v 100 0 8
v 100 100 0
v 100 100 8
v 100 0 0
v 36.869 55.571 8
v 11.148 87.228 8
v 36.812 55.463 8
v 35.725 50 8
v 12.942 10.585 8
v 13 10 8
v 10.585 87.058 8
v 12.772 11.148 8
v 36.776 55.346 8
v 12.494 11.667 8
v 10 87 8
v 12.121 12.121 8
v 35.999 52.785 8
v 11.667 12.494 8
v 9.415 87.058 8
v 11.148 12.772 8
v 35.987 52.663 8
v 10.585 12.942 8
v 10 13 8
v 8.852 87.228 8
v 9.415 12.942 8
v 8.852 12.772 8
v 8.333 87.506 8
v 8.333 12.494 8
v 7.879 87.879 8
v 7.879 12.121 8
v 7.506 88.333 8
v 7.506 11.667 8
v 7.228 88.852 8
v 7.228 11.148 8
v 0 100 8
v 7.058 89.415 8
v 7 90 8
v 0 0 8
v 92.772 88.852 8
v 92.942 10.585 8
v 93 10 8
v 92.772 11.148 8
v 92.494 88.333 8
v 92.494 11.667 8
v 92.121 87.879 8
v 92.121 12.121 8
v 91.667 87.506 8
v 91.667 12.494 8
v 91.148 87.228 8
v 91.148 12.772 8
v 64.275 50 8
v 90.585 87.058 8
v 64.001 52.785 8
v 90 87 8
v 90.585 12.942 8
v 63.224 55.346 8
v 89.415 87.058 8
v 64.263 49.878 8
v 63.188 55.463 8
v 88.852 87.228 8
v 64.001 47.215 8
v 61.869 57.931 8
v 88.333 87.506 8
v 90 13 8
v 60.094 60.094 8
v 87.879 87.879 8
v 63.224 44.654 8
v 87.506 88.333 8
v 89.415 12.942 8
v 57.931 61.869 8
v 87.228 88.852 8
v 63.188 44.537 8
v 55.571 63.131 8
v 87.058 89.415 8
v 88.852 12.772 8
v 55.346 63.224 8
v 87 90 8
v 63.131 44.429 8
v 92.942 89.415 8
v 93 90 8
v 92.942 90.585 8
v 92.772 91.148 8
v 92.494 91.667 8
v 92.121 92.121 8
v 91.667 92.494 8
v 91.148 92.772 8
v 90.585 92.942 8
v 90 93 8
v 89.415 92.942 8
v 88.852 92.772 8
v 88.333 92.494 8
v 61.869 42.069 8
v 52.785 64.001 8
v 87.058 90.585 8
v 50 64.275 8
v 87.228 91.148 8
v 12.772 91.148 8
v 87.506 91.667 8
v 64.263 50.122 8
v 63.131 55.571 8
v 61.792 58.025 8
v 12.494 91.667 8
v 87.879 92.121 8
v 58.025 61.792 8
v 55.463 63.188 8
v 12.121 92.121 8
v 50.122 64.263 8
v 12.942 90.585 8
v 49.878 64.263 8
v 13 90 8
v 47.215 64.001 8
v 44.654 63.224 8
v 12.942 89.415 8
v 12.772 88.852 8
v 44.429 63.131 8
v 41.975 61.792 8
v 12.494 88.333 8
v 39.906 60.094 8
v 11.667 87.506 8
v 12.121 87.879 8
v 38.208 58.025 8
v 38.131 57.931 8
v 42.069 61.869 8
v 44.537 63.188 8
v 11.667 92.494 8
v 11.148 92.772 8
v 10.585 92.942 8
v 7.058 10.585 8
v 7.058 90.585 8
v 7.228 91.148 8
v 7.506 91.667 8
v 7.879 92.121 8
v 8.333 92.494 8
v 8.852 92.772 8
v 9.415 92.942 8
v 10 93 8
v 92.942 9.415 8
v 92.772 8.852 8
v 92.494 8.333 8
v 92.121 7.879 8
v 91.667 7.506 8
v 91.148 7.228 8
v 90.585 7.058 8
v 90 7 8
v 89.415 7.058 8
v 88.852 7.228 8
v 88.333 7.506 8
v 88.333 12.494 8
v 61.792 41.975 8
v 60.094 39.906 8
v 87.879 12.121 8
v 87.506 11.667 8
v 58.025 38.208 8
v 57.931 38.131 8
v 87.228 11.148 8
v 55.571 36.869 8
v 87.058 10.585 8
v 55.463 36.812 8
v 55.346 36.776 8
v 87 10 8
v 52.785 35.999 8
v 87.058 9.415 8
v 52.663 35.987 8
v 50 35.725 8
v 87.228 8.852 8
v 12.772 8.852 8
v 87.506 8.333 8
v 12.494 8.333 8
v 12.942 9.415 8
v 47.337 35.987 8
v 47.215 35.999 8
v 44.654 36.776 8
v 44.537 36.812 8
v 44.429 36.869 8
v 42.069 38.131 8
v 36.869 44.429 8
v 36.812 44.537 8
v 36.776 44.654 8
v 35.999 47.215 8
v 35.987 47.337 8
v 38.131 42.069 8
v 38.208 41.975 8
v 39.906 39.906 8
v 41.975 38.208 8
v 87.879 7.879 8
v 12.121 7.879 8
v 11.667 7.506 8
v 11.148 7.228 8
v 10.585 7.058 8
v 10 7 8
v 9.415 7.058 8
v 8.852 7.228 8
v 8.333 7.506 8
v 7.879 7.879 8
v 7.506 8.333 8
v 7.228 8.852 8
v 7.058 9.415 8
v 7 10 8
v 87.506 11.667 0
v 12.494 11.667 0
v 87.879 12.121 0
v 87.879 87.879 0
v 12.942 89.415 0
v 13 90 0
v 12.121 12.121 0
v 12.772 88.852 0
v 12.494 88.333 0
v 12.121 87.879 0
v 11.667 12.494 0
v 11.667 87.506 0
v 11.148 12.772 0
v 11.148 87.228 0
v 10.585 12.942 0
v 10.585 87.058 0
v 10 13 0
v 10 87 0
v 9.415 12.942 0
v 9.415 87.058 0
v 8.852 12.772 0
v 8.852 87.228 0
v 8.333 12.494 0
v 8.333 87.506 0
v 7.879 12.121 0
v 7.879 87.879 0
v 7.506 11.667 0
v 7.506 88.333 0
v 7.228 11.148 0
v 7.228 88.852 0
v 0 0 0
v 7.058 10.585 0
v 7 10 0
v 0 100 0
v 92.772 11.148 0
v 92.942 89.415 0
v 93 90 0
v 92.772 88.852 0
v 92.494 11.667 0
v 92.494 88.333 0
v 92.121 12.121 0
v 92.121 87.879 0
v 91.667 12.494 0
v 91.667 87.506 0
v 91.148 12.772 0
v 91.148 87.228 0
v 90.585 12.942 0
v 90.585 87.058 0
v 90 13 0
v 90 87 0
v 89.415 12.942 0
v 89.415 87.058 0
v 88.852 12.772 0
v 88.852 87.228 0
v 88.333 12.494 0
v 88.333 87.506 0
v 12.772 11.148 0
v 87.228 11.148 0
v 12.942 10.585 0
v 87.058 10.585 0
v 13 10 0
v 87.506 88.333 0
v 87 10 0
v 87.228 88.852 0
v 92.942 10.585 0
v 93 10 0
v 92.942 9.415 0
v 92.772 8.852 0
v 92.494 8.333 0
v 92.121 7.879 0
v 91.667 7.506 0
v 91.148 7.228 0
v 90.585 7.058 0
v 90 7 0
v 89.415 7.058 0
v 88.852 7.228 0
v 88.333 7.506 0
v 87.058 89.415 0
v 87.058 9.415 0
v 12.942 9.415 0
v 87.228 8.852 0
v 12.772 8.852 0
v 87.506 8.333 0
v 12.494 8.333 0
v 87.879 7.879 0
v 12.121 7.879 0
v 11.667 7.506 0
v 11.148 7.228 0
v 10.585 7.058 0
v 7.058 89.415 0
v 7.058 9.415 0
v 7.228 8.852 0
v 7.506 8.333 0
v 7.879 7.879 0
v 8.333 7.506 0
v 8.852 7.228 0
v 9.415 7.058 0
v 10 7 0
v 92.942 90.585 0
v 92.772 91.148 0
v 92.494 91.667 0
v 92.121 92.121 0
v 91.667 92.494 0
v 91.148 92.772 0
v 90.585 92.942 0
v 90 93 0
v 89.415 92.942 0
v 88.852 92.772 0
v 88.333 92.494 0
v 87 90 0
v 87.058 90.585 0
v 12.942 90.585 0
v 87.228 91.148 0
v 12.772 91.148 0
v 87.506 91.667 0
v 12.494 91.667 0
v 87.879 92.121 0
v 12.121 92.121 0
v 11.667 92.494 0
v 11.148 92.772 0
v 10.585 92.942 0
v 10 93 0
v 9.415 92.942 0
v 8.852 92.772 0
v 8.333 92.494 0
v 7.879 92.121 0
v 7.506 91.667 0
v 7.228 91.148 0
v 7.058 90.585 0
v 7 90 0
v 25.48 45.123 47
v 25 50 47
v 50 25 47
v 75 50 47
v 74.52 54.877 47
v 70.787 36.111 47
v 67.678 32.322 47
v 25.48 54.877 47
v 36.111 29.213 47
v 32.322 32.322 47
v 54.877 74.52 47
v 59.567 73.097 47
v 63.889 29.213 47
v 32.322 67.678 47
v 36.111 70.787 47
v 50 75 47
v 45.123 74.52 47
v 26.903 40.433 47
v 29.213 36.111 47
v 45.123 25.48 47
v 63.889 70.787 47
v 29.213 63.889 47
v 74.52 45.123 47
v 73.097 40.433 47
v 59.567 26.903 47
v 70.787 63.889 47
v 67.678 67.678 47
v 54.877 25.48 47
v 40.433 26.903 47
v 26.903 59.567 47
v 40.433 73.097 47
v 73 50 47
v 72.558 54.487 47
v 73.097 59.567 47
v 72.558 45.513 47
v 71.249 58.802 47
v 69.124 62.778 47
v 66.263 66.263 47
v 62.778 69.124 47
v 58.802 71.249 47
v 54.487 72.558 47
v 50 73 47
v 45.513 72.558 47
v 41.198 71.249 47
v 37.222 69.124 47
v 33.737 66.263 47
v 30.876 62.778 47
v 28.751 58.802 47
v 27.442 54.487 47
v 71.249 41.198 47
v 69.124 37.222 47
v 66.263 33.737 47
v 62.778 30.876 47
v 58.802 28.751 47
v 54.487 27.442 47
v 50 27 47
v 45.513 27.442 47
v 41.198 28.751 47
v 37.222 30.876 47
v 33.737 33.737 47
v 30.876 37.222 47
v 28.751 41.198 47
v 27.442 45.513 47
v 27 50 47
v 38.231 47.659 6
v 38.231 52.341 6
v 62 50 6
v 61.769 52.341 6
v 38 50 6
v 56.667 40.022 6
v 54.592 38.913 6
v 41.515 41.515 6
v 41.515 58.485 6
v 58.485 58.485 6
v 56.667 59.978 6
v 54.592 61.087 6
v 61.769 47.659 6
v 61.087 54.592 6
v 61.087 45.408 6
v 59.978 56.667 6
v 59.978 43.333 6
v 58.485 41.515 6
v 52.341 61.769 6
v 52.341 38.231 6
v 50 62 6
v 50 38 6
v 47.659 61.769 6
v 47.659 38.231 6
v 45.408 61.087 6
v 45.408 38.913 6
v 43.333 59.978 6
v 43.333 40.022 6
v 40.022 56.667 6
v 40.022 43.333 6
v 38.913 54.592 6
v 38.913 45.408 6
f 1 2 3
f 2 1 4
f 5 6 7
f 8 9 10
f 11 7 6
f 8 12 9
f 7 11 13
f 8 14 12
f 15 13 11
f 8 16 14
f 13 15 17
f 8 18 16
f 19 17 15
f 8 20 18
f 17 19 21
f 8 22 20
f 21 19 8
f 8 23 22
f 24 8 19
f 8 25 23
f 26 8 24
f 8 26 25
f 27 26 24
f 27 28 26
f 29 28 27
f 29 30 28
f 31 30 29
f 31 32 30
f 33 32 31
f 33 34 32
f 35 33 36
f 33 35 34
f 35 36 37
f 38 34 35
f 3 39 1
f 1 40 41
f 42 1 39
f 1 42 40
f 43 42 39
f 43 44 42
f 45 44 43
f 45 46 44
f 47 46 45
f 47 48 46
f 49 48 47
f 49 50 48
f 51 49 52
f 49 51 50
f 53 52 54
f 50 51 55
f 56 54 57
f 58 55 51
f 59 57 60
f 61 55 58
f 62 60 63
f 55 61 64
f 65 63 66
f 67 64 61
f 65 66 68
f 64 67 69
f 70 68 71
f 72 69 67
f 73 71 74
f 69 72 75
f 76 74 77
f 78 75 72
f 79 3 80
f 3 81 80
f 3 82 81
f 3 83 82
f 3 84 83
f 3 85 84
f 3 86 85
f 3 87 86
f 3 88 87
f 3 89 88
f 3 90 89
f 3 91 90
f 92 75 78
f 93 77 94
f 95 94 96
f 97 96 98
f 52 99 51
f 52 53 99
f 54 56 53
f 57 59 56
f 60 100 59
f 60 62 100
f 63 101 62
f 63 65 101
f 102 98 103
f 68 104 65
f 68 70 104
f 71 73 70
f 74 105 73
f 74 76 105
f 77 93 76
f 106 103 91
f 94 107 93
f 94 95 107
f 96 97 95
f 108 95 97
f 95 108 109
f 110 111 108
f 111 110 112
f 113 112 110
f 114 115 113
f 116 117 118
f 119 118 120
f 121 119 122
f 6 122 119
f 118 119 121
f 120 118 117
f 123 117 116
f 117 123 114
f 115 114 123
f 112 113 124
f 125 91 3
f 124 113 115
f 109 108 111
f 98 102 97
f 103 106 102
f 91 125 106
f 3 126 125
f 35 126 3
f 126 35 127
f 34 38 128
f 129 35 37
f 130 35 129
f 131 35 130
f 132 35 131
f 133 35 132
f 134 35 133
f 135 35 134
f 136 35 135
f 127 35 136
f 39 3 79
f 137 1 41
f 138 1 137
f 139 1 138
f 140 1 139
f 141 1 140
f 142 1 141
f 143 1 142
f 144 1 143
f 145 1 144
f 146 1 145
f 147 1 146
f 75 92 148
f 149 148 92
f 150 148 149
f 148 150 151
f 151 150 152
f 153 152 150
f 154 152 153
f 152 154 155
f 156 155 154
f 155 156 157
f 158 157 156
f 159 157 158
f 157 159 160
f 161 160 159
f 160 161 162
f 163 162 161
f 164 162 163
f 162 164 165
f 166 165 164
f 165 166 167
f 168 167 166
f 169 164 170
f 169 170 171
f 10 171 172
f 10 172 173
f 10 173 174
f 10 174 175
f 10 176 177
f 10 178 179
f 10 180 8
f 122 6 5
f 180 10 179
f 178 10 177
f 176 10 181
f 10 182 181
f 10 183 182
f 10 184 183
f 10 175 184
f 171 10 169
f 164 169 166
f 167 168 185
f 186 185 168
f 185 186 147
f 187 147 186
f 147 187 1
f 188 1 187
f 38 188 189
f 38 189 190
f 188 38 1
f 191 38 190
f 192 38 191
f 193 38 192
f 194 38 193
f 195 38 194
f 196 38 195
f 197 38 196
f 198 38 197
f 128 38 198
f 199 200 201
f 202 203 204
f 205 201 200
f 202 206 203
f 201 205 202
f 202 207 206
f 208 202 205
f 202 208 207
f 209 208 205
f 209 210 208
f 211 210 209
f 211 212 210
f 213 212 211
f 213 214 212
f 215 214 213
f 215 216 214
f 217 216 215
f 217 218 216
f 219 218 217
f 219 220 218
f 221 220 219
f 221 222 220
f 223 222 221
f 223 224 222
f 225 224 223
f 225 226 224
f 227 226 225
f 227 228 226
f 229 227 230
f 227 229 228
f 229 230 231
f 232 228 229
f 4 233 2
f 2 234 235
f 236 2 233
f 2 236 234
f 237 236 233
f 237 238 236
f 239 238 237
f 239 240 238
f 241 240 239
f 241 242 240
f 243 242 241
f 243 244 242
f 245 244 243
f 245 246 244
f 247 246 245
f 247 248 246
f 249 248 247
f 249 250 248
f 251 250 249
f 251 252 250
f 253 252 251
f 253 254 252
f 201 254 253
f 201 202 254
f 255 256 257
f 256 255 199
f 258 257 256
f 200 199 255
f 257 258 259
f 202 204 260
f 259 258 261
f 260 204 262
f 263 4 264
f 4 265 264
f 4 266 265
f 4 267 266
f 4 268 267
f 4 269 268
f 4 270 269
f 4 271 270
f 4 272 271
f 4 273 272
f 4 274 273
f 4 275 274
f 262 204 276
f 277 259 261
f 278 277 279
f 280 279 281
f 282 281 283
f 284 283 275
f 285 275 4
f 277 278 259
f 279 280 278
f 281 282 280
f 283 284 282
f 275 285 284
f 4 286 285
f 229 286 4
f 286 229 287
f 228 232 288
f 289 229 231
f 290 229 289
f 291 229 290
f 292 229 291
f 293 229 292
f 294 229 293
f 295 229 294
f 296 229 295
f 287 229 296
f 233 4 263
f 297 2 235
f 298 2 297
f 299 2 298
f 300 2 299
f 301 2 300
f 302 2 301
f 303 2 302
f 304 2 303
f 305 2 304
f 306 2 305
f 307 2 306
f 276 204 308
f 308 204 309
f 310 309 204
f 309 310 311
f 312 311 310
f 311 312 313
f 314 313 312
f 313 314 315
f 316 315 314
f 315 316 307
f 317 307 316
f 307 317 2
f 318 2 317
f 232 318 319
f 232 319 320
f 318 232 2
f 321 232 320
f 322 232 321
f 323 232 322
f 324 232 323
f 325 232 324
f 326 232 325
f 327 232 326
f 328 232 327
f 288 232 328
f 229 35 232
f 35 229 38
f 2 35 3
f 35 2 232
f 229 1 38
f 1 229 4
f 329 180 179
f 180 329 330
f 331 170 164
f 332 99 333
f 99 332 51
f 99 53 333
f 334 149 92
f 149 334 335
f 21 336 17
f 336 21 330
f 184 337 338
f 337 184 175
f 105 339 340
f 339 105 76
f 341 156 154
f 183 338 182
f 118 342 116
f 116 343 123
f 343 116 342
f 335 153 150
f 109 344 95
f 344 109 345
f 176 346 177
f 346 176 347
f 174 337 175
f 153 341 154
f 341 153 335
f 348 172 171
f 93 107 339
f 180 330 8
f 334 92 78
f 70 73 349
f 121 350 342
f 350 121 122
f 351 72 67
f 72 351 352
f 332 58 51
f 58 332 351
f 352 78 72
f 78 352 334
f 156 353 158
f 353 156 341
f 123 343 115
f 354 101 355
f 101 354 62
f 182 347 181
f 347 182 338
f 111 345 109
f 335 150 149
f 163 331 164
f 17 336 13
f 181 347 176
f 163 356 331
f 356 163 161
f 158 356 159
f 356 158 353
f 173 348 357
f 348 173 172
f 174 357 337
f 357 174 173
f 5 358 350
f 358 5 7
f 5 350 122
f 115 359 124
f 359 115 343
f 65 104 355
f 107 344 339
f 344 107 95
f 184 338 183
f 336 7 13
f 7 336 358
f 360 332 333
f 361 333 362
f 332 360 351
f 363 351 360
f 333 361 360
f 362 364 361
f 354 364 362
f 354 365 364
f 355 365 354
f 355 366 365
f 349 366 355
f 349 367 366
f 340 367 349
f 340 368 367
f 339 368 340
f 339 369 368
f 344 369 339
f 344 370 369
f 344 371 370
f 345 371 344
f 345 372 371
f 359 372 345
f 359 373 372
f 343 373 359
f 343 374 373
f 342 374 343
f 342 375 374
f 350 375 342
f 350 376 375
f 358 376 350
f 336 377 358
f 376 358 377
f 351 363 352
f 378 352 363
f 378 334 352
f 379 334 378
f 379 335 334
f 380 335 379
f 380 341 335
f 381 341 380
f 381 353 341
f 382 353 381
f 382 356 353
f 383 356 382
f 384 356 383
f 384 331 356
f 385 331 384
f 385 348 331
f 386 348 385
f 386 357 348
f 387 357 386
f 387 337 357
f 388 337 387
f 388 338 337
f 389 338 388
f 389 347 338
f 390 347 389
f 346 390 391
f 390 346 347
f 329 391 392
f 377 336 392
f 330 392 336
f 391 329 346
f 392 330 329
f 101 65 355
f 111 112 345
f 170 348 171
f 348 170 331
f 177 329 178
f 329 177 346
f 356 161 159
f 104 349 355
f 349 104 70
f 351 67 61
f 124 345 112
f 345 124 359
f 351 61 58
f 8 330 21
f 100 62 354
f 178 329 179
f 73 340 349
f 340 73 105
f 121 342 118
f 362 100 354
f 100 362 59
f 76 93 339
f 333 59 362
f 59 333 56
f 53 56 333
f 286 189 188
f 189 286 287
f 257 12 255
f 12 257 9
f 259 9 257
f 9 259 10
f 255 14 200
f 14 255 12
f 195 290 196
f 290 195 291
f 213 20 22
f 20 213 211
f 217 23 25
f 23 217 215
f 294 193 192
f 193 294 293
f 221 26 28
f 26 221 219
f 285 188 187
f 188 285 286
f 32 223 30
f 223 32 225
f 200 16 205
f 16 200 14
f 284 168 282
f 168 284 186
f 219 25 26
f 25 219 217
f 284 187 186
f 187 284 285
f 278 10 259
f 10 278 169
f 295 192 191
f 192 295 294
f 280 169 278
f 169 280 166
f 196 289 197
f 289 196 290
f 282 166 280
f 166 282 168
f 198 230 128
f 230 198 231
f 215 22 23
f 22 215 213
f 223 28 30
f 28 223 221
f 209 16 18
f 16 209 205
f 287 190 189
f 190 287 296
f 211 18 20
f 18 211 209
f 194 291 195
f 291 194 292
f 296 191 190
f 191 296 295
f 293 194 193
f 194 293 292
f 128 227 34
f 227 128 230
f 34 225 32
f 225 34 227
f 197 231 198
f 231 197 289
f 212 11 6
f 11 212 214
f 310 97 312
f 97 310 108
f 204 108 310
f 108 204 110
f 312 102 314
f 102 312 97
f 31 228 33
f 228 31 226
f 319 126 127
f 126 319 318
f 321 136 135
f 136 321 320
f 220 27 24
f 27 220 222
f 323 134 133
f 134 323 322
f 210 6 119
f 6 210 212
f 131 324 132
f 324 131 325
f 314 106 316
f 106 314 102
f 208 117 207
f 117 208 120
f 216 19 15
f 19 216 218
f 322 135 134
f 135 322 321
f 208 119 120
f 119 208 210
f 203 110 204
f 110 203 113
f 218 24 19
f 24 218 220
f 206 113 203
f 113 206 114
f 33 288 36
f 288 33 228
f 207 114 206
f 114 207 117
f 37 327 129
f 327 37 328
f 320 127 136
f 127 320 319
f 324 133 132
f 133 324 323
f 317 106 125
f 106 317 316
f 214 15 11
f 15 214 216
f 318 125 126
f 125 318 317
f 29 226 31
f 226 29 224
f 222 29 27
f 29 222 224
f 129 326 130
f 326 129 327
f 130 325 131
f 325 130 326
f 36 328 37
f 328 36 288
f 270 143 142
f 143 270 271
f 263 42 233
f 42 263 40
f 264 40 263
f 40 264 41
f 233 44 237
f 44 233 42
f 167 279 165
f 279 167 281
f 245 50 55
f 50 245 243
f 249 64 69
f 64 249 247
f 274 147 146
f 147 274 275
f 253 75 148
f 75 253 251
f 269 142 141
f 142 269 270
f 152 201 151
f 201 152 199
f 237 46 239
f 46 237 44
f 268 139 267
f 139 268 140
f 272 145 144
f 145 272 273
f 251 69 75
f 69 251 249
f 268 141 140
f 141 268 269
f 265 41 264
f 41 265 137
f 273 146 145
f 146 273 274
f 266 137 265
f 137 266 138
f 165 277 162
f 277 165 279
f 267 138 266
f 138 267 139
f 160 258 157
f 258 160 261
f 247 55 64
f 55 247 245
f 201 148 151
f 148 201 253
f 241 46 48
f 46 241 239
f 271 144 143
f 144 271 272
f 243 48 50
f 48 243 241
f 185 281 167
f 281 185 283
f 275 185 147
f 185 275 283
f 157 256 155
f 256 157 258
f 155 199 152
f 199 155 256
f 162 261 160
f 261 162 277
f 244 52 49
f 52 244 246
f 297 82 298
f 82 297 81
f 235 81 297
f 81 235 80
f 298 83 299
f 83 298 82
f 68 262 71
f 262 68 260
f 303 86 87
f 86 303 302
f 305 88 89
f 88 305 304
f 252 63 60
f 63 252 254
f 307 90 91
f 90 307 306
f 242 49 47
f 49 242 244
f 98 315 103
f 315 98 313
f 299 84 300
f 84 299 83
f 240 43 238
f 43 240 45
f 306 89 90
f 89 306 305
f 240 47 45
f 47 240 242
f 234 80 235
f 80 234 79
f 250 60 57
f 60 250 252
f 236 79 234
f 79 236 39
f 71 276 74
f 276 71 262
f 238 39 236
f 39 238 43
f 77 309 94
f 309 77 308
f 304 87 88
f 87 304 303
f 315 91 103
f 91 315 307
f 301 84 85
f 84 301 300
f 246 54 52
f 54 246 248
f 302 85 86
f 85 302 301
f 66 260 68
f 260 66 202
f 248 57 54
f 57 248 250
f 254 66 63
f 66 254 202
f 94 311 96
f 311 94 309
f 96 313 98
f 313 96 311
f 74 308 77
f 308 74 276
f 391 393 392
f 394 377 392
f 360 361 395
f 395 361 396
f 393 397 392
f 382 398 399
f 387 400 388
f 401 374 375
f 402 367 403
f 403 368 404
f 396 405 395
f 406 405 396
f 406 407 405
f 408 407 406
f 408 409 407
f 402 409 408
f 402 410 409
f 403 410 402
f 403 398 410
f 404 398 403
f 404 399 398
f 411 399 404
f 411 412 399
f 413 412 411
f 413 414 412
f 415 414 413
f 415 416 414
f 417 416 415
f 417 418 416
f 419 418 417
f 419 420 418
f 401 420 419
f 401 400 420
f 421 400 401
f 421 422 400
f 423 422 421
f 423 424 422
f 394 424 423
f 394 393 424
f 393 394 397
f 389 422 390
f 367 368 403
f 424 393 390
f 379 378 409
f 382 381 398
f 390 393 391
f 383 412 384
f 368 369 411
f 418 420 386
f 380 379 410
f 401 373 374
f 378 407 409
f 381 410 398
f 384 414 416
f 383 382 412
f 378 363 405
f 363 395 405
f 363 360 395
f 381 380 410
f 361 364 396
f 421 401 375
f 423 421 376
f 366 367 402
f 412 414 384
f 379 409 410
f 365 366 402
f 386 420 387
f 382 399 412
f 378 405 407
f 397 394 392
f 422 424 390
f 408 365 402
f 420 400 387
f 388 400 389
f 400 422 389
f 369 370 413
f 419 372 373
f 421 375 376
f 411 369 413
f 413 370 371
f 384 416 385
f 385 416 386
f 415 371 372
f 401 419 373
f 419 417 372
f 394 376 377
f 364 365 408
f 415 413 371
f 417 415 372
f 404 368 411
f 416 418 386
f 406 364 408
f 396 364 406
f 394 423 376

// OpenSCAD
$fn = 32;

// ----------------------------------------------------------------------
// Hopper: flanged with square flange
// ----------------------------------------------------------------------

// --- parameters (mm) ---
fl = 100;                 // flange side, X and Y
fl_t = 8;                 // flange thickness
cone_h = 40;              // cone height above the flange
top_d = 50;               // cone mouth diameter
bot_d = 28;               // cone spout diameter
wall = 2;                 // cone wall thickness
hole_r = 3;               // flange hole radius
hole_in = 10;             // hole inset from the corners

bore_d = bot_d - 2 * wall;  // spout bore diameter
total_h = fl_t + cone_h - 1;  // overall height

difference() {
  union() {
    cube([fl, fl, fl_t]);
    translate([fl / 2, fl / 2, fl_t - 1])
      cylinder(h = cone_h, d1 = bot_d, d2 = top_d);
  }
  translate([fl / 2, fl / 2, fl_t - 2])
    cylinder(h = cone_h + 1, d1 = bore_d, d2 = top_d - 2 * wall);
  for (sx = [0, 1], sy = [0, 1])
    translate([sx ? fl - hole_in : hole_in,
               sy ? fl - hole_in : hole_in, -1])
      cylinder(r = hole_r, h = fl_t + 2);
}
